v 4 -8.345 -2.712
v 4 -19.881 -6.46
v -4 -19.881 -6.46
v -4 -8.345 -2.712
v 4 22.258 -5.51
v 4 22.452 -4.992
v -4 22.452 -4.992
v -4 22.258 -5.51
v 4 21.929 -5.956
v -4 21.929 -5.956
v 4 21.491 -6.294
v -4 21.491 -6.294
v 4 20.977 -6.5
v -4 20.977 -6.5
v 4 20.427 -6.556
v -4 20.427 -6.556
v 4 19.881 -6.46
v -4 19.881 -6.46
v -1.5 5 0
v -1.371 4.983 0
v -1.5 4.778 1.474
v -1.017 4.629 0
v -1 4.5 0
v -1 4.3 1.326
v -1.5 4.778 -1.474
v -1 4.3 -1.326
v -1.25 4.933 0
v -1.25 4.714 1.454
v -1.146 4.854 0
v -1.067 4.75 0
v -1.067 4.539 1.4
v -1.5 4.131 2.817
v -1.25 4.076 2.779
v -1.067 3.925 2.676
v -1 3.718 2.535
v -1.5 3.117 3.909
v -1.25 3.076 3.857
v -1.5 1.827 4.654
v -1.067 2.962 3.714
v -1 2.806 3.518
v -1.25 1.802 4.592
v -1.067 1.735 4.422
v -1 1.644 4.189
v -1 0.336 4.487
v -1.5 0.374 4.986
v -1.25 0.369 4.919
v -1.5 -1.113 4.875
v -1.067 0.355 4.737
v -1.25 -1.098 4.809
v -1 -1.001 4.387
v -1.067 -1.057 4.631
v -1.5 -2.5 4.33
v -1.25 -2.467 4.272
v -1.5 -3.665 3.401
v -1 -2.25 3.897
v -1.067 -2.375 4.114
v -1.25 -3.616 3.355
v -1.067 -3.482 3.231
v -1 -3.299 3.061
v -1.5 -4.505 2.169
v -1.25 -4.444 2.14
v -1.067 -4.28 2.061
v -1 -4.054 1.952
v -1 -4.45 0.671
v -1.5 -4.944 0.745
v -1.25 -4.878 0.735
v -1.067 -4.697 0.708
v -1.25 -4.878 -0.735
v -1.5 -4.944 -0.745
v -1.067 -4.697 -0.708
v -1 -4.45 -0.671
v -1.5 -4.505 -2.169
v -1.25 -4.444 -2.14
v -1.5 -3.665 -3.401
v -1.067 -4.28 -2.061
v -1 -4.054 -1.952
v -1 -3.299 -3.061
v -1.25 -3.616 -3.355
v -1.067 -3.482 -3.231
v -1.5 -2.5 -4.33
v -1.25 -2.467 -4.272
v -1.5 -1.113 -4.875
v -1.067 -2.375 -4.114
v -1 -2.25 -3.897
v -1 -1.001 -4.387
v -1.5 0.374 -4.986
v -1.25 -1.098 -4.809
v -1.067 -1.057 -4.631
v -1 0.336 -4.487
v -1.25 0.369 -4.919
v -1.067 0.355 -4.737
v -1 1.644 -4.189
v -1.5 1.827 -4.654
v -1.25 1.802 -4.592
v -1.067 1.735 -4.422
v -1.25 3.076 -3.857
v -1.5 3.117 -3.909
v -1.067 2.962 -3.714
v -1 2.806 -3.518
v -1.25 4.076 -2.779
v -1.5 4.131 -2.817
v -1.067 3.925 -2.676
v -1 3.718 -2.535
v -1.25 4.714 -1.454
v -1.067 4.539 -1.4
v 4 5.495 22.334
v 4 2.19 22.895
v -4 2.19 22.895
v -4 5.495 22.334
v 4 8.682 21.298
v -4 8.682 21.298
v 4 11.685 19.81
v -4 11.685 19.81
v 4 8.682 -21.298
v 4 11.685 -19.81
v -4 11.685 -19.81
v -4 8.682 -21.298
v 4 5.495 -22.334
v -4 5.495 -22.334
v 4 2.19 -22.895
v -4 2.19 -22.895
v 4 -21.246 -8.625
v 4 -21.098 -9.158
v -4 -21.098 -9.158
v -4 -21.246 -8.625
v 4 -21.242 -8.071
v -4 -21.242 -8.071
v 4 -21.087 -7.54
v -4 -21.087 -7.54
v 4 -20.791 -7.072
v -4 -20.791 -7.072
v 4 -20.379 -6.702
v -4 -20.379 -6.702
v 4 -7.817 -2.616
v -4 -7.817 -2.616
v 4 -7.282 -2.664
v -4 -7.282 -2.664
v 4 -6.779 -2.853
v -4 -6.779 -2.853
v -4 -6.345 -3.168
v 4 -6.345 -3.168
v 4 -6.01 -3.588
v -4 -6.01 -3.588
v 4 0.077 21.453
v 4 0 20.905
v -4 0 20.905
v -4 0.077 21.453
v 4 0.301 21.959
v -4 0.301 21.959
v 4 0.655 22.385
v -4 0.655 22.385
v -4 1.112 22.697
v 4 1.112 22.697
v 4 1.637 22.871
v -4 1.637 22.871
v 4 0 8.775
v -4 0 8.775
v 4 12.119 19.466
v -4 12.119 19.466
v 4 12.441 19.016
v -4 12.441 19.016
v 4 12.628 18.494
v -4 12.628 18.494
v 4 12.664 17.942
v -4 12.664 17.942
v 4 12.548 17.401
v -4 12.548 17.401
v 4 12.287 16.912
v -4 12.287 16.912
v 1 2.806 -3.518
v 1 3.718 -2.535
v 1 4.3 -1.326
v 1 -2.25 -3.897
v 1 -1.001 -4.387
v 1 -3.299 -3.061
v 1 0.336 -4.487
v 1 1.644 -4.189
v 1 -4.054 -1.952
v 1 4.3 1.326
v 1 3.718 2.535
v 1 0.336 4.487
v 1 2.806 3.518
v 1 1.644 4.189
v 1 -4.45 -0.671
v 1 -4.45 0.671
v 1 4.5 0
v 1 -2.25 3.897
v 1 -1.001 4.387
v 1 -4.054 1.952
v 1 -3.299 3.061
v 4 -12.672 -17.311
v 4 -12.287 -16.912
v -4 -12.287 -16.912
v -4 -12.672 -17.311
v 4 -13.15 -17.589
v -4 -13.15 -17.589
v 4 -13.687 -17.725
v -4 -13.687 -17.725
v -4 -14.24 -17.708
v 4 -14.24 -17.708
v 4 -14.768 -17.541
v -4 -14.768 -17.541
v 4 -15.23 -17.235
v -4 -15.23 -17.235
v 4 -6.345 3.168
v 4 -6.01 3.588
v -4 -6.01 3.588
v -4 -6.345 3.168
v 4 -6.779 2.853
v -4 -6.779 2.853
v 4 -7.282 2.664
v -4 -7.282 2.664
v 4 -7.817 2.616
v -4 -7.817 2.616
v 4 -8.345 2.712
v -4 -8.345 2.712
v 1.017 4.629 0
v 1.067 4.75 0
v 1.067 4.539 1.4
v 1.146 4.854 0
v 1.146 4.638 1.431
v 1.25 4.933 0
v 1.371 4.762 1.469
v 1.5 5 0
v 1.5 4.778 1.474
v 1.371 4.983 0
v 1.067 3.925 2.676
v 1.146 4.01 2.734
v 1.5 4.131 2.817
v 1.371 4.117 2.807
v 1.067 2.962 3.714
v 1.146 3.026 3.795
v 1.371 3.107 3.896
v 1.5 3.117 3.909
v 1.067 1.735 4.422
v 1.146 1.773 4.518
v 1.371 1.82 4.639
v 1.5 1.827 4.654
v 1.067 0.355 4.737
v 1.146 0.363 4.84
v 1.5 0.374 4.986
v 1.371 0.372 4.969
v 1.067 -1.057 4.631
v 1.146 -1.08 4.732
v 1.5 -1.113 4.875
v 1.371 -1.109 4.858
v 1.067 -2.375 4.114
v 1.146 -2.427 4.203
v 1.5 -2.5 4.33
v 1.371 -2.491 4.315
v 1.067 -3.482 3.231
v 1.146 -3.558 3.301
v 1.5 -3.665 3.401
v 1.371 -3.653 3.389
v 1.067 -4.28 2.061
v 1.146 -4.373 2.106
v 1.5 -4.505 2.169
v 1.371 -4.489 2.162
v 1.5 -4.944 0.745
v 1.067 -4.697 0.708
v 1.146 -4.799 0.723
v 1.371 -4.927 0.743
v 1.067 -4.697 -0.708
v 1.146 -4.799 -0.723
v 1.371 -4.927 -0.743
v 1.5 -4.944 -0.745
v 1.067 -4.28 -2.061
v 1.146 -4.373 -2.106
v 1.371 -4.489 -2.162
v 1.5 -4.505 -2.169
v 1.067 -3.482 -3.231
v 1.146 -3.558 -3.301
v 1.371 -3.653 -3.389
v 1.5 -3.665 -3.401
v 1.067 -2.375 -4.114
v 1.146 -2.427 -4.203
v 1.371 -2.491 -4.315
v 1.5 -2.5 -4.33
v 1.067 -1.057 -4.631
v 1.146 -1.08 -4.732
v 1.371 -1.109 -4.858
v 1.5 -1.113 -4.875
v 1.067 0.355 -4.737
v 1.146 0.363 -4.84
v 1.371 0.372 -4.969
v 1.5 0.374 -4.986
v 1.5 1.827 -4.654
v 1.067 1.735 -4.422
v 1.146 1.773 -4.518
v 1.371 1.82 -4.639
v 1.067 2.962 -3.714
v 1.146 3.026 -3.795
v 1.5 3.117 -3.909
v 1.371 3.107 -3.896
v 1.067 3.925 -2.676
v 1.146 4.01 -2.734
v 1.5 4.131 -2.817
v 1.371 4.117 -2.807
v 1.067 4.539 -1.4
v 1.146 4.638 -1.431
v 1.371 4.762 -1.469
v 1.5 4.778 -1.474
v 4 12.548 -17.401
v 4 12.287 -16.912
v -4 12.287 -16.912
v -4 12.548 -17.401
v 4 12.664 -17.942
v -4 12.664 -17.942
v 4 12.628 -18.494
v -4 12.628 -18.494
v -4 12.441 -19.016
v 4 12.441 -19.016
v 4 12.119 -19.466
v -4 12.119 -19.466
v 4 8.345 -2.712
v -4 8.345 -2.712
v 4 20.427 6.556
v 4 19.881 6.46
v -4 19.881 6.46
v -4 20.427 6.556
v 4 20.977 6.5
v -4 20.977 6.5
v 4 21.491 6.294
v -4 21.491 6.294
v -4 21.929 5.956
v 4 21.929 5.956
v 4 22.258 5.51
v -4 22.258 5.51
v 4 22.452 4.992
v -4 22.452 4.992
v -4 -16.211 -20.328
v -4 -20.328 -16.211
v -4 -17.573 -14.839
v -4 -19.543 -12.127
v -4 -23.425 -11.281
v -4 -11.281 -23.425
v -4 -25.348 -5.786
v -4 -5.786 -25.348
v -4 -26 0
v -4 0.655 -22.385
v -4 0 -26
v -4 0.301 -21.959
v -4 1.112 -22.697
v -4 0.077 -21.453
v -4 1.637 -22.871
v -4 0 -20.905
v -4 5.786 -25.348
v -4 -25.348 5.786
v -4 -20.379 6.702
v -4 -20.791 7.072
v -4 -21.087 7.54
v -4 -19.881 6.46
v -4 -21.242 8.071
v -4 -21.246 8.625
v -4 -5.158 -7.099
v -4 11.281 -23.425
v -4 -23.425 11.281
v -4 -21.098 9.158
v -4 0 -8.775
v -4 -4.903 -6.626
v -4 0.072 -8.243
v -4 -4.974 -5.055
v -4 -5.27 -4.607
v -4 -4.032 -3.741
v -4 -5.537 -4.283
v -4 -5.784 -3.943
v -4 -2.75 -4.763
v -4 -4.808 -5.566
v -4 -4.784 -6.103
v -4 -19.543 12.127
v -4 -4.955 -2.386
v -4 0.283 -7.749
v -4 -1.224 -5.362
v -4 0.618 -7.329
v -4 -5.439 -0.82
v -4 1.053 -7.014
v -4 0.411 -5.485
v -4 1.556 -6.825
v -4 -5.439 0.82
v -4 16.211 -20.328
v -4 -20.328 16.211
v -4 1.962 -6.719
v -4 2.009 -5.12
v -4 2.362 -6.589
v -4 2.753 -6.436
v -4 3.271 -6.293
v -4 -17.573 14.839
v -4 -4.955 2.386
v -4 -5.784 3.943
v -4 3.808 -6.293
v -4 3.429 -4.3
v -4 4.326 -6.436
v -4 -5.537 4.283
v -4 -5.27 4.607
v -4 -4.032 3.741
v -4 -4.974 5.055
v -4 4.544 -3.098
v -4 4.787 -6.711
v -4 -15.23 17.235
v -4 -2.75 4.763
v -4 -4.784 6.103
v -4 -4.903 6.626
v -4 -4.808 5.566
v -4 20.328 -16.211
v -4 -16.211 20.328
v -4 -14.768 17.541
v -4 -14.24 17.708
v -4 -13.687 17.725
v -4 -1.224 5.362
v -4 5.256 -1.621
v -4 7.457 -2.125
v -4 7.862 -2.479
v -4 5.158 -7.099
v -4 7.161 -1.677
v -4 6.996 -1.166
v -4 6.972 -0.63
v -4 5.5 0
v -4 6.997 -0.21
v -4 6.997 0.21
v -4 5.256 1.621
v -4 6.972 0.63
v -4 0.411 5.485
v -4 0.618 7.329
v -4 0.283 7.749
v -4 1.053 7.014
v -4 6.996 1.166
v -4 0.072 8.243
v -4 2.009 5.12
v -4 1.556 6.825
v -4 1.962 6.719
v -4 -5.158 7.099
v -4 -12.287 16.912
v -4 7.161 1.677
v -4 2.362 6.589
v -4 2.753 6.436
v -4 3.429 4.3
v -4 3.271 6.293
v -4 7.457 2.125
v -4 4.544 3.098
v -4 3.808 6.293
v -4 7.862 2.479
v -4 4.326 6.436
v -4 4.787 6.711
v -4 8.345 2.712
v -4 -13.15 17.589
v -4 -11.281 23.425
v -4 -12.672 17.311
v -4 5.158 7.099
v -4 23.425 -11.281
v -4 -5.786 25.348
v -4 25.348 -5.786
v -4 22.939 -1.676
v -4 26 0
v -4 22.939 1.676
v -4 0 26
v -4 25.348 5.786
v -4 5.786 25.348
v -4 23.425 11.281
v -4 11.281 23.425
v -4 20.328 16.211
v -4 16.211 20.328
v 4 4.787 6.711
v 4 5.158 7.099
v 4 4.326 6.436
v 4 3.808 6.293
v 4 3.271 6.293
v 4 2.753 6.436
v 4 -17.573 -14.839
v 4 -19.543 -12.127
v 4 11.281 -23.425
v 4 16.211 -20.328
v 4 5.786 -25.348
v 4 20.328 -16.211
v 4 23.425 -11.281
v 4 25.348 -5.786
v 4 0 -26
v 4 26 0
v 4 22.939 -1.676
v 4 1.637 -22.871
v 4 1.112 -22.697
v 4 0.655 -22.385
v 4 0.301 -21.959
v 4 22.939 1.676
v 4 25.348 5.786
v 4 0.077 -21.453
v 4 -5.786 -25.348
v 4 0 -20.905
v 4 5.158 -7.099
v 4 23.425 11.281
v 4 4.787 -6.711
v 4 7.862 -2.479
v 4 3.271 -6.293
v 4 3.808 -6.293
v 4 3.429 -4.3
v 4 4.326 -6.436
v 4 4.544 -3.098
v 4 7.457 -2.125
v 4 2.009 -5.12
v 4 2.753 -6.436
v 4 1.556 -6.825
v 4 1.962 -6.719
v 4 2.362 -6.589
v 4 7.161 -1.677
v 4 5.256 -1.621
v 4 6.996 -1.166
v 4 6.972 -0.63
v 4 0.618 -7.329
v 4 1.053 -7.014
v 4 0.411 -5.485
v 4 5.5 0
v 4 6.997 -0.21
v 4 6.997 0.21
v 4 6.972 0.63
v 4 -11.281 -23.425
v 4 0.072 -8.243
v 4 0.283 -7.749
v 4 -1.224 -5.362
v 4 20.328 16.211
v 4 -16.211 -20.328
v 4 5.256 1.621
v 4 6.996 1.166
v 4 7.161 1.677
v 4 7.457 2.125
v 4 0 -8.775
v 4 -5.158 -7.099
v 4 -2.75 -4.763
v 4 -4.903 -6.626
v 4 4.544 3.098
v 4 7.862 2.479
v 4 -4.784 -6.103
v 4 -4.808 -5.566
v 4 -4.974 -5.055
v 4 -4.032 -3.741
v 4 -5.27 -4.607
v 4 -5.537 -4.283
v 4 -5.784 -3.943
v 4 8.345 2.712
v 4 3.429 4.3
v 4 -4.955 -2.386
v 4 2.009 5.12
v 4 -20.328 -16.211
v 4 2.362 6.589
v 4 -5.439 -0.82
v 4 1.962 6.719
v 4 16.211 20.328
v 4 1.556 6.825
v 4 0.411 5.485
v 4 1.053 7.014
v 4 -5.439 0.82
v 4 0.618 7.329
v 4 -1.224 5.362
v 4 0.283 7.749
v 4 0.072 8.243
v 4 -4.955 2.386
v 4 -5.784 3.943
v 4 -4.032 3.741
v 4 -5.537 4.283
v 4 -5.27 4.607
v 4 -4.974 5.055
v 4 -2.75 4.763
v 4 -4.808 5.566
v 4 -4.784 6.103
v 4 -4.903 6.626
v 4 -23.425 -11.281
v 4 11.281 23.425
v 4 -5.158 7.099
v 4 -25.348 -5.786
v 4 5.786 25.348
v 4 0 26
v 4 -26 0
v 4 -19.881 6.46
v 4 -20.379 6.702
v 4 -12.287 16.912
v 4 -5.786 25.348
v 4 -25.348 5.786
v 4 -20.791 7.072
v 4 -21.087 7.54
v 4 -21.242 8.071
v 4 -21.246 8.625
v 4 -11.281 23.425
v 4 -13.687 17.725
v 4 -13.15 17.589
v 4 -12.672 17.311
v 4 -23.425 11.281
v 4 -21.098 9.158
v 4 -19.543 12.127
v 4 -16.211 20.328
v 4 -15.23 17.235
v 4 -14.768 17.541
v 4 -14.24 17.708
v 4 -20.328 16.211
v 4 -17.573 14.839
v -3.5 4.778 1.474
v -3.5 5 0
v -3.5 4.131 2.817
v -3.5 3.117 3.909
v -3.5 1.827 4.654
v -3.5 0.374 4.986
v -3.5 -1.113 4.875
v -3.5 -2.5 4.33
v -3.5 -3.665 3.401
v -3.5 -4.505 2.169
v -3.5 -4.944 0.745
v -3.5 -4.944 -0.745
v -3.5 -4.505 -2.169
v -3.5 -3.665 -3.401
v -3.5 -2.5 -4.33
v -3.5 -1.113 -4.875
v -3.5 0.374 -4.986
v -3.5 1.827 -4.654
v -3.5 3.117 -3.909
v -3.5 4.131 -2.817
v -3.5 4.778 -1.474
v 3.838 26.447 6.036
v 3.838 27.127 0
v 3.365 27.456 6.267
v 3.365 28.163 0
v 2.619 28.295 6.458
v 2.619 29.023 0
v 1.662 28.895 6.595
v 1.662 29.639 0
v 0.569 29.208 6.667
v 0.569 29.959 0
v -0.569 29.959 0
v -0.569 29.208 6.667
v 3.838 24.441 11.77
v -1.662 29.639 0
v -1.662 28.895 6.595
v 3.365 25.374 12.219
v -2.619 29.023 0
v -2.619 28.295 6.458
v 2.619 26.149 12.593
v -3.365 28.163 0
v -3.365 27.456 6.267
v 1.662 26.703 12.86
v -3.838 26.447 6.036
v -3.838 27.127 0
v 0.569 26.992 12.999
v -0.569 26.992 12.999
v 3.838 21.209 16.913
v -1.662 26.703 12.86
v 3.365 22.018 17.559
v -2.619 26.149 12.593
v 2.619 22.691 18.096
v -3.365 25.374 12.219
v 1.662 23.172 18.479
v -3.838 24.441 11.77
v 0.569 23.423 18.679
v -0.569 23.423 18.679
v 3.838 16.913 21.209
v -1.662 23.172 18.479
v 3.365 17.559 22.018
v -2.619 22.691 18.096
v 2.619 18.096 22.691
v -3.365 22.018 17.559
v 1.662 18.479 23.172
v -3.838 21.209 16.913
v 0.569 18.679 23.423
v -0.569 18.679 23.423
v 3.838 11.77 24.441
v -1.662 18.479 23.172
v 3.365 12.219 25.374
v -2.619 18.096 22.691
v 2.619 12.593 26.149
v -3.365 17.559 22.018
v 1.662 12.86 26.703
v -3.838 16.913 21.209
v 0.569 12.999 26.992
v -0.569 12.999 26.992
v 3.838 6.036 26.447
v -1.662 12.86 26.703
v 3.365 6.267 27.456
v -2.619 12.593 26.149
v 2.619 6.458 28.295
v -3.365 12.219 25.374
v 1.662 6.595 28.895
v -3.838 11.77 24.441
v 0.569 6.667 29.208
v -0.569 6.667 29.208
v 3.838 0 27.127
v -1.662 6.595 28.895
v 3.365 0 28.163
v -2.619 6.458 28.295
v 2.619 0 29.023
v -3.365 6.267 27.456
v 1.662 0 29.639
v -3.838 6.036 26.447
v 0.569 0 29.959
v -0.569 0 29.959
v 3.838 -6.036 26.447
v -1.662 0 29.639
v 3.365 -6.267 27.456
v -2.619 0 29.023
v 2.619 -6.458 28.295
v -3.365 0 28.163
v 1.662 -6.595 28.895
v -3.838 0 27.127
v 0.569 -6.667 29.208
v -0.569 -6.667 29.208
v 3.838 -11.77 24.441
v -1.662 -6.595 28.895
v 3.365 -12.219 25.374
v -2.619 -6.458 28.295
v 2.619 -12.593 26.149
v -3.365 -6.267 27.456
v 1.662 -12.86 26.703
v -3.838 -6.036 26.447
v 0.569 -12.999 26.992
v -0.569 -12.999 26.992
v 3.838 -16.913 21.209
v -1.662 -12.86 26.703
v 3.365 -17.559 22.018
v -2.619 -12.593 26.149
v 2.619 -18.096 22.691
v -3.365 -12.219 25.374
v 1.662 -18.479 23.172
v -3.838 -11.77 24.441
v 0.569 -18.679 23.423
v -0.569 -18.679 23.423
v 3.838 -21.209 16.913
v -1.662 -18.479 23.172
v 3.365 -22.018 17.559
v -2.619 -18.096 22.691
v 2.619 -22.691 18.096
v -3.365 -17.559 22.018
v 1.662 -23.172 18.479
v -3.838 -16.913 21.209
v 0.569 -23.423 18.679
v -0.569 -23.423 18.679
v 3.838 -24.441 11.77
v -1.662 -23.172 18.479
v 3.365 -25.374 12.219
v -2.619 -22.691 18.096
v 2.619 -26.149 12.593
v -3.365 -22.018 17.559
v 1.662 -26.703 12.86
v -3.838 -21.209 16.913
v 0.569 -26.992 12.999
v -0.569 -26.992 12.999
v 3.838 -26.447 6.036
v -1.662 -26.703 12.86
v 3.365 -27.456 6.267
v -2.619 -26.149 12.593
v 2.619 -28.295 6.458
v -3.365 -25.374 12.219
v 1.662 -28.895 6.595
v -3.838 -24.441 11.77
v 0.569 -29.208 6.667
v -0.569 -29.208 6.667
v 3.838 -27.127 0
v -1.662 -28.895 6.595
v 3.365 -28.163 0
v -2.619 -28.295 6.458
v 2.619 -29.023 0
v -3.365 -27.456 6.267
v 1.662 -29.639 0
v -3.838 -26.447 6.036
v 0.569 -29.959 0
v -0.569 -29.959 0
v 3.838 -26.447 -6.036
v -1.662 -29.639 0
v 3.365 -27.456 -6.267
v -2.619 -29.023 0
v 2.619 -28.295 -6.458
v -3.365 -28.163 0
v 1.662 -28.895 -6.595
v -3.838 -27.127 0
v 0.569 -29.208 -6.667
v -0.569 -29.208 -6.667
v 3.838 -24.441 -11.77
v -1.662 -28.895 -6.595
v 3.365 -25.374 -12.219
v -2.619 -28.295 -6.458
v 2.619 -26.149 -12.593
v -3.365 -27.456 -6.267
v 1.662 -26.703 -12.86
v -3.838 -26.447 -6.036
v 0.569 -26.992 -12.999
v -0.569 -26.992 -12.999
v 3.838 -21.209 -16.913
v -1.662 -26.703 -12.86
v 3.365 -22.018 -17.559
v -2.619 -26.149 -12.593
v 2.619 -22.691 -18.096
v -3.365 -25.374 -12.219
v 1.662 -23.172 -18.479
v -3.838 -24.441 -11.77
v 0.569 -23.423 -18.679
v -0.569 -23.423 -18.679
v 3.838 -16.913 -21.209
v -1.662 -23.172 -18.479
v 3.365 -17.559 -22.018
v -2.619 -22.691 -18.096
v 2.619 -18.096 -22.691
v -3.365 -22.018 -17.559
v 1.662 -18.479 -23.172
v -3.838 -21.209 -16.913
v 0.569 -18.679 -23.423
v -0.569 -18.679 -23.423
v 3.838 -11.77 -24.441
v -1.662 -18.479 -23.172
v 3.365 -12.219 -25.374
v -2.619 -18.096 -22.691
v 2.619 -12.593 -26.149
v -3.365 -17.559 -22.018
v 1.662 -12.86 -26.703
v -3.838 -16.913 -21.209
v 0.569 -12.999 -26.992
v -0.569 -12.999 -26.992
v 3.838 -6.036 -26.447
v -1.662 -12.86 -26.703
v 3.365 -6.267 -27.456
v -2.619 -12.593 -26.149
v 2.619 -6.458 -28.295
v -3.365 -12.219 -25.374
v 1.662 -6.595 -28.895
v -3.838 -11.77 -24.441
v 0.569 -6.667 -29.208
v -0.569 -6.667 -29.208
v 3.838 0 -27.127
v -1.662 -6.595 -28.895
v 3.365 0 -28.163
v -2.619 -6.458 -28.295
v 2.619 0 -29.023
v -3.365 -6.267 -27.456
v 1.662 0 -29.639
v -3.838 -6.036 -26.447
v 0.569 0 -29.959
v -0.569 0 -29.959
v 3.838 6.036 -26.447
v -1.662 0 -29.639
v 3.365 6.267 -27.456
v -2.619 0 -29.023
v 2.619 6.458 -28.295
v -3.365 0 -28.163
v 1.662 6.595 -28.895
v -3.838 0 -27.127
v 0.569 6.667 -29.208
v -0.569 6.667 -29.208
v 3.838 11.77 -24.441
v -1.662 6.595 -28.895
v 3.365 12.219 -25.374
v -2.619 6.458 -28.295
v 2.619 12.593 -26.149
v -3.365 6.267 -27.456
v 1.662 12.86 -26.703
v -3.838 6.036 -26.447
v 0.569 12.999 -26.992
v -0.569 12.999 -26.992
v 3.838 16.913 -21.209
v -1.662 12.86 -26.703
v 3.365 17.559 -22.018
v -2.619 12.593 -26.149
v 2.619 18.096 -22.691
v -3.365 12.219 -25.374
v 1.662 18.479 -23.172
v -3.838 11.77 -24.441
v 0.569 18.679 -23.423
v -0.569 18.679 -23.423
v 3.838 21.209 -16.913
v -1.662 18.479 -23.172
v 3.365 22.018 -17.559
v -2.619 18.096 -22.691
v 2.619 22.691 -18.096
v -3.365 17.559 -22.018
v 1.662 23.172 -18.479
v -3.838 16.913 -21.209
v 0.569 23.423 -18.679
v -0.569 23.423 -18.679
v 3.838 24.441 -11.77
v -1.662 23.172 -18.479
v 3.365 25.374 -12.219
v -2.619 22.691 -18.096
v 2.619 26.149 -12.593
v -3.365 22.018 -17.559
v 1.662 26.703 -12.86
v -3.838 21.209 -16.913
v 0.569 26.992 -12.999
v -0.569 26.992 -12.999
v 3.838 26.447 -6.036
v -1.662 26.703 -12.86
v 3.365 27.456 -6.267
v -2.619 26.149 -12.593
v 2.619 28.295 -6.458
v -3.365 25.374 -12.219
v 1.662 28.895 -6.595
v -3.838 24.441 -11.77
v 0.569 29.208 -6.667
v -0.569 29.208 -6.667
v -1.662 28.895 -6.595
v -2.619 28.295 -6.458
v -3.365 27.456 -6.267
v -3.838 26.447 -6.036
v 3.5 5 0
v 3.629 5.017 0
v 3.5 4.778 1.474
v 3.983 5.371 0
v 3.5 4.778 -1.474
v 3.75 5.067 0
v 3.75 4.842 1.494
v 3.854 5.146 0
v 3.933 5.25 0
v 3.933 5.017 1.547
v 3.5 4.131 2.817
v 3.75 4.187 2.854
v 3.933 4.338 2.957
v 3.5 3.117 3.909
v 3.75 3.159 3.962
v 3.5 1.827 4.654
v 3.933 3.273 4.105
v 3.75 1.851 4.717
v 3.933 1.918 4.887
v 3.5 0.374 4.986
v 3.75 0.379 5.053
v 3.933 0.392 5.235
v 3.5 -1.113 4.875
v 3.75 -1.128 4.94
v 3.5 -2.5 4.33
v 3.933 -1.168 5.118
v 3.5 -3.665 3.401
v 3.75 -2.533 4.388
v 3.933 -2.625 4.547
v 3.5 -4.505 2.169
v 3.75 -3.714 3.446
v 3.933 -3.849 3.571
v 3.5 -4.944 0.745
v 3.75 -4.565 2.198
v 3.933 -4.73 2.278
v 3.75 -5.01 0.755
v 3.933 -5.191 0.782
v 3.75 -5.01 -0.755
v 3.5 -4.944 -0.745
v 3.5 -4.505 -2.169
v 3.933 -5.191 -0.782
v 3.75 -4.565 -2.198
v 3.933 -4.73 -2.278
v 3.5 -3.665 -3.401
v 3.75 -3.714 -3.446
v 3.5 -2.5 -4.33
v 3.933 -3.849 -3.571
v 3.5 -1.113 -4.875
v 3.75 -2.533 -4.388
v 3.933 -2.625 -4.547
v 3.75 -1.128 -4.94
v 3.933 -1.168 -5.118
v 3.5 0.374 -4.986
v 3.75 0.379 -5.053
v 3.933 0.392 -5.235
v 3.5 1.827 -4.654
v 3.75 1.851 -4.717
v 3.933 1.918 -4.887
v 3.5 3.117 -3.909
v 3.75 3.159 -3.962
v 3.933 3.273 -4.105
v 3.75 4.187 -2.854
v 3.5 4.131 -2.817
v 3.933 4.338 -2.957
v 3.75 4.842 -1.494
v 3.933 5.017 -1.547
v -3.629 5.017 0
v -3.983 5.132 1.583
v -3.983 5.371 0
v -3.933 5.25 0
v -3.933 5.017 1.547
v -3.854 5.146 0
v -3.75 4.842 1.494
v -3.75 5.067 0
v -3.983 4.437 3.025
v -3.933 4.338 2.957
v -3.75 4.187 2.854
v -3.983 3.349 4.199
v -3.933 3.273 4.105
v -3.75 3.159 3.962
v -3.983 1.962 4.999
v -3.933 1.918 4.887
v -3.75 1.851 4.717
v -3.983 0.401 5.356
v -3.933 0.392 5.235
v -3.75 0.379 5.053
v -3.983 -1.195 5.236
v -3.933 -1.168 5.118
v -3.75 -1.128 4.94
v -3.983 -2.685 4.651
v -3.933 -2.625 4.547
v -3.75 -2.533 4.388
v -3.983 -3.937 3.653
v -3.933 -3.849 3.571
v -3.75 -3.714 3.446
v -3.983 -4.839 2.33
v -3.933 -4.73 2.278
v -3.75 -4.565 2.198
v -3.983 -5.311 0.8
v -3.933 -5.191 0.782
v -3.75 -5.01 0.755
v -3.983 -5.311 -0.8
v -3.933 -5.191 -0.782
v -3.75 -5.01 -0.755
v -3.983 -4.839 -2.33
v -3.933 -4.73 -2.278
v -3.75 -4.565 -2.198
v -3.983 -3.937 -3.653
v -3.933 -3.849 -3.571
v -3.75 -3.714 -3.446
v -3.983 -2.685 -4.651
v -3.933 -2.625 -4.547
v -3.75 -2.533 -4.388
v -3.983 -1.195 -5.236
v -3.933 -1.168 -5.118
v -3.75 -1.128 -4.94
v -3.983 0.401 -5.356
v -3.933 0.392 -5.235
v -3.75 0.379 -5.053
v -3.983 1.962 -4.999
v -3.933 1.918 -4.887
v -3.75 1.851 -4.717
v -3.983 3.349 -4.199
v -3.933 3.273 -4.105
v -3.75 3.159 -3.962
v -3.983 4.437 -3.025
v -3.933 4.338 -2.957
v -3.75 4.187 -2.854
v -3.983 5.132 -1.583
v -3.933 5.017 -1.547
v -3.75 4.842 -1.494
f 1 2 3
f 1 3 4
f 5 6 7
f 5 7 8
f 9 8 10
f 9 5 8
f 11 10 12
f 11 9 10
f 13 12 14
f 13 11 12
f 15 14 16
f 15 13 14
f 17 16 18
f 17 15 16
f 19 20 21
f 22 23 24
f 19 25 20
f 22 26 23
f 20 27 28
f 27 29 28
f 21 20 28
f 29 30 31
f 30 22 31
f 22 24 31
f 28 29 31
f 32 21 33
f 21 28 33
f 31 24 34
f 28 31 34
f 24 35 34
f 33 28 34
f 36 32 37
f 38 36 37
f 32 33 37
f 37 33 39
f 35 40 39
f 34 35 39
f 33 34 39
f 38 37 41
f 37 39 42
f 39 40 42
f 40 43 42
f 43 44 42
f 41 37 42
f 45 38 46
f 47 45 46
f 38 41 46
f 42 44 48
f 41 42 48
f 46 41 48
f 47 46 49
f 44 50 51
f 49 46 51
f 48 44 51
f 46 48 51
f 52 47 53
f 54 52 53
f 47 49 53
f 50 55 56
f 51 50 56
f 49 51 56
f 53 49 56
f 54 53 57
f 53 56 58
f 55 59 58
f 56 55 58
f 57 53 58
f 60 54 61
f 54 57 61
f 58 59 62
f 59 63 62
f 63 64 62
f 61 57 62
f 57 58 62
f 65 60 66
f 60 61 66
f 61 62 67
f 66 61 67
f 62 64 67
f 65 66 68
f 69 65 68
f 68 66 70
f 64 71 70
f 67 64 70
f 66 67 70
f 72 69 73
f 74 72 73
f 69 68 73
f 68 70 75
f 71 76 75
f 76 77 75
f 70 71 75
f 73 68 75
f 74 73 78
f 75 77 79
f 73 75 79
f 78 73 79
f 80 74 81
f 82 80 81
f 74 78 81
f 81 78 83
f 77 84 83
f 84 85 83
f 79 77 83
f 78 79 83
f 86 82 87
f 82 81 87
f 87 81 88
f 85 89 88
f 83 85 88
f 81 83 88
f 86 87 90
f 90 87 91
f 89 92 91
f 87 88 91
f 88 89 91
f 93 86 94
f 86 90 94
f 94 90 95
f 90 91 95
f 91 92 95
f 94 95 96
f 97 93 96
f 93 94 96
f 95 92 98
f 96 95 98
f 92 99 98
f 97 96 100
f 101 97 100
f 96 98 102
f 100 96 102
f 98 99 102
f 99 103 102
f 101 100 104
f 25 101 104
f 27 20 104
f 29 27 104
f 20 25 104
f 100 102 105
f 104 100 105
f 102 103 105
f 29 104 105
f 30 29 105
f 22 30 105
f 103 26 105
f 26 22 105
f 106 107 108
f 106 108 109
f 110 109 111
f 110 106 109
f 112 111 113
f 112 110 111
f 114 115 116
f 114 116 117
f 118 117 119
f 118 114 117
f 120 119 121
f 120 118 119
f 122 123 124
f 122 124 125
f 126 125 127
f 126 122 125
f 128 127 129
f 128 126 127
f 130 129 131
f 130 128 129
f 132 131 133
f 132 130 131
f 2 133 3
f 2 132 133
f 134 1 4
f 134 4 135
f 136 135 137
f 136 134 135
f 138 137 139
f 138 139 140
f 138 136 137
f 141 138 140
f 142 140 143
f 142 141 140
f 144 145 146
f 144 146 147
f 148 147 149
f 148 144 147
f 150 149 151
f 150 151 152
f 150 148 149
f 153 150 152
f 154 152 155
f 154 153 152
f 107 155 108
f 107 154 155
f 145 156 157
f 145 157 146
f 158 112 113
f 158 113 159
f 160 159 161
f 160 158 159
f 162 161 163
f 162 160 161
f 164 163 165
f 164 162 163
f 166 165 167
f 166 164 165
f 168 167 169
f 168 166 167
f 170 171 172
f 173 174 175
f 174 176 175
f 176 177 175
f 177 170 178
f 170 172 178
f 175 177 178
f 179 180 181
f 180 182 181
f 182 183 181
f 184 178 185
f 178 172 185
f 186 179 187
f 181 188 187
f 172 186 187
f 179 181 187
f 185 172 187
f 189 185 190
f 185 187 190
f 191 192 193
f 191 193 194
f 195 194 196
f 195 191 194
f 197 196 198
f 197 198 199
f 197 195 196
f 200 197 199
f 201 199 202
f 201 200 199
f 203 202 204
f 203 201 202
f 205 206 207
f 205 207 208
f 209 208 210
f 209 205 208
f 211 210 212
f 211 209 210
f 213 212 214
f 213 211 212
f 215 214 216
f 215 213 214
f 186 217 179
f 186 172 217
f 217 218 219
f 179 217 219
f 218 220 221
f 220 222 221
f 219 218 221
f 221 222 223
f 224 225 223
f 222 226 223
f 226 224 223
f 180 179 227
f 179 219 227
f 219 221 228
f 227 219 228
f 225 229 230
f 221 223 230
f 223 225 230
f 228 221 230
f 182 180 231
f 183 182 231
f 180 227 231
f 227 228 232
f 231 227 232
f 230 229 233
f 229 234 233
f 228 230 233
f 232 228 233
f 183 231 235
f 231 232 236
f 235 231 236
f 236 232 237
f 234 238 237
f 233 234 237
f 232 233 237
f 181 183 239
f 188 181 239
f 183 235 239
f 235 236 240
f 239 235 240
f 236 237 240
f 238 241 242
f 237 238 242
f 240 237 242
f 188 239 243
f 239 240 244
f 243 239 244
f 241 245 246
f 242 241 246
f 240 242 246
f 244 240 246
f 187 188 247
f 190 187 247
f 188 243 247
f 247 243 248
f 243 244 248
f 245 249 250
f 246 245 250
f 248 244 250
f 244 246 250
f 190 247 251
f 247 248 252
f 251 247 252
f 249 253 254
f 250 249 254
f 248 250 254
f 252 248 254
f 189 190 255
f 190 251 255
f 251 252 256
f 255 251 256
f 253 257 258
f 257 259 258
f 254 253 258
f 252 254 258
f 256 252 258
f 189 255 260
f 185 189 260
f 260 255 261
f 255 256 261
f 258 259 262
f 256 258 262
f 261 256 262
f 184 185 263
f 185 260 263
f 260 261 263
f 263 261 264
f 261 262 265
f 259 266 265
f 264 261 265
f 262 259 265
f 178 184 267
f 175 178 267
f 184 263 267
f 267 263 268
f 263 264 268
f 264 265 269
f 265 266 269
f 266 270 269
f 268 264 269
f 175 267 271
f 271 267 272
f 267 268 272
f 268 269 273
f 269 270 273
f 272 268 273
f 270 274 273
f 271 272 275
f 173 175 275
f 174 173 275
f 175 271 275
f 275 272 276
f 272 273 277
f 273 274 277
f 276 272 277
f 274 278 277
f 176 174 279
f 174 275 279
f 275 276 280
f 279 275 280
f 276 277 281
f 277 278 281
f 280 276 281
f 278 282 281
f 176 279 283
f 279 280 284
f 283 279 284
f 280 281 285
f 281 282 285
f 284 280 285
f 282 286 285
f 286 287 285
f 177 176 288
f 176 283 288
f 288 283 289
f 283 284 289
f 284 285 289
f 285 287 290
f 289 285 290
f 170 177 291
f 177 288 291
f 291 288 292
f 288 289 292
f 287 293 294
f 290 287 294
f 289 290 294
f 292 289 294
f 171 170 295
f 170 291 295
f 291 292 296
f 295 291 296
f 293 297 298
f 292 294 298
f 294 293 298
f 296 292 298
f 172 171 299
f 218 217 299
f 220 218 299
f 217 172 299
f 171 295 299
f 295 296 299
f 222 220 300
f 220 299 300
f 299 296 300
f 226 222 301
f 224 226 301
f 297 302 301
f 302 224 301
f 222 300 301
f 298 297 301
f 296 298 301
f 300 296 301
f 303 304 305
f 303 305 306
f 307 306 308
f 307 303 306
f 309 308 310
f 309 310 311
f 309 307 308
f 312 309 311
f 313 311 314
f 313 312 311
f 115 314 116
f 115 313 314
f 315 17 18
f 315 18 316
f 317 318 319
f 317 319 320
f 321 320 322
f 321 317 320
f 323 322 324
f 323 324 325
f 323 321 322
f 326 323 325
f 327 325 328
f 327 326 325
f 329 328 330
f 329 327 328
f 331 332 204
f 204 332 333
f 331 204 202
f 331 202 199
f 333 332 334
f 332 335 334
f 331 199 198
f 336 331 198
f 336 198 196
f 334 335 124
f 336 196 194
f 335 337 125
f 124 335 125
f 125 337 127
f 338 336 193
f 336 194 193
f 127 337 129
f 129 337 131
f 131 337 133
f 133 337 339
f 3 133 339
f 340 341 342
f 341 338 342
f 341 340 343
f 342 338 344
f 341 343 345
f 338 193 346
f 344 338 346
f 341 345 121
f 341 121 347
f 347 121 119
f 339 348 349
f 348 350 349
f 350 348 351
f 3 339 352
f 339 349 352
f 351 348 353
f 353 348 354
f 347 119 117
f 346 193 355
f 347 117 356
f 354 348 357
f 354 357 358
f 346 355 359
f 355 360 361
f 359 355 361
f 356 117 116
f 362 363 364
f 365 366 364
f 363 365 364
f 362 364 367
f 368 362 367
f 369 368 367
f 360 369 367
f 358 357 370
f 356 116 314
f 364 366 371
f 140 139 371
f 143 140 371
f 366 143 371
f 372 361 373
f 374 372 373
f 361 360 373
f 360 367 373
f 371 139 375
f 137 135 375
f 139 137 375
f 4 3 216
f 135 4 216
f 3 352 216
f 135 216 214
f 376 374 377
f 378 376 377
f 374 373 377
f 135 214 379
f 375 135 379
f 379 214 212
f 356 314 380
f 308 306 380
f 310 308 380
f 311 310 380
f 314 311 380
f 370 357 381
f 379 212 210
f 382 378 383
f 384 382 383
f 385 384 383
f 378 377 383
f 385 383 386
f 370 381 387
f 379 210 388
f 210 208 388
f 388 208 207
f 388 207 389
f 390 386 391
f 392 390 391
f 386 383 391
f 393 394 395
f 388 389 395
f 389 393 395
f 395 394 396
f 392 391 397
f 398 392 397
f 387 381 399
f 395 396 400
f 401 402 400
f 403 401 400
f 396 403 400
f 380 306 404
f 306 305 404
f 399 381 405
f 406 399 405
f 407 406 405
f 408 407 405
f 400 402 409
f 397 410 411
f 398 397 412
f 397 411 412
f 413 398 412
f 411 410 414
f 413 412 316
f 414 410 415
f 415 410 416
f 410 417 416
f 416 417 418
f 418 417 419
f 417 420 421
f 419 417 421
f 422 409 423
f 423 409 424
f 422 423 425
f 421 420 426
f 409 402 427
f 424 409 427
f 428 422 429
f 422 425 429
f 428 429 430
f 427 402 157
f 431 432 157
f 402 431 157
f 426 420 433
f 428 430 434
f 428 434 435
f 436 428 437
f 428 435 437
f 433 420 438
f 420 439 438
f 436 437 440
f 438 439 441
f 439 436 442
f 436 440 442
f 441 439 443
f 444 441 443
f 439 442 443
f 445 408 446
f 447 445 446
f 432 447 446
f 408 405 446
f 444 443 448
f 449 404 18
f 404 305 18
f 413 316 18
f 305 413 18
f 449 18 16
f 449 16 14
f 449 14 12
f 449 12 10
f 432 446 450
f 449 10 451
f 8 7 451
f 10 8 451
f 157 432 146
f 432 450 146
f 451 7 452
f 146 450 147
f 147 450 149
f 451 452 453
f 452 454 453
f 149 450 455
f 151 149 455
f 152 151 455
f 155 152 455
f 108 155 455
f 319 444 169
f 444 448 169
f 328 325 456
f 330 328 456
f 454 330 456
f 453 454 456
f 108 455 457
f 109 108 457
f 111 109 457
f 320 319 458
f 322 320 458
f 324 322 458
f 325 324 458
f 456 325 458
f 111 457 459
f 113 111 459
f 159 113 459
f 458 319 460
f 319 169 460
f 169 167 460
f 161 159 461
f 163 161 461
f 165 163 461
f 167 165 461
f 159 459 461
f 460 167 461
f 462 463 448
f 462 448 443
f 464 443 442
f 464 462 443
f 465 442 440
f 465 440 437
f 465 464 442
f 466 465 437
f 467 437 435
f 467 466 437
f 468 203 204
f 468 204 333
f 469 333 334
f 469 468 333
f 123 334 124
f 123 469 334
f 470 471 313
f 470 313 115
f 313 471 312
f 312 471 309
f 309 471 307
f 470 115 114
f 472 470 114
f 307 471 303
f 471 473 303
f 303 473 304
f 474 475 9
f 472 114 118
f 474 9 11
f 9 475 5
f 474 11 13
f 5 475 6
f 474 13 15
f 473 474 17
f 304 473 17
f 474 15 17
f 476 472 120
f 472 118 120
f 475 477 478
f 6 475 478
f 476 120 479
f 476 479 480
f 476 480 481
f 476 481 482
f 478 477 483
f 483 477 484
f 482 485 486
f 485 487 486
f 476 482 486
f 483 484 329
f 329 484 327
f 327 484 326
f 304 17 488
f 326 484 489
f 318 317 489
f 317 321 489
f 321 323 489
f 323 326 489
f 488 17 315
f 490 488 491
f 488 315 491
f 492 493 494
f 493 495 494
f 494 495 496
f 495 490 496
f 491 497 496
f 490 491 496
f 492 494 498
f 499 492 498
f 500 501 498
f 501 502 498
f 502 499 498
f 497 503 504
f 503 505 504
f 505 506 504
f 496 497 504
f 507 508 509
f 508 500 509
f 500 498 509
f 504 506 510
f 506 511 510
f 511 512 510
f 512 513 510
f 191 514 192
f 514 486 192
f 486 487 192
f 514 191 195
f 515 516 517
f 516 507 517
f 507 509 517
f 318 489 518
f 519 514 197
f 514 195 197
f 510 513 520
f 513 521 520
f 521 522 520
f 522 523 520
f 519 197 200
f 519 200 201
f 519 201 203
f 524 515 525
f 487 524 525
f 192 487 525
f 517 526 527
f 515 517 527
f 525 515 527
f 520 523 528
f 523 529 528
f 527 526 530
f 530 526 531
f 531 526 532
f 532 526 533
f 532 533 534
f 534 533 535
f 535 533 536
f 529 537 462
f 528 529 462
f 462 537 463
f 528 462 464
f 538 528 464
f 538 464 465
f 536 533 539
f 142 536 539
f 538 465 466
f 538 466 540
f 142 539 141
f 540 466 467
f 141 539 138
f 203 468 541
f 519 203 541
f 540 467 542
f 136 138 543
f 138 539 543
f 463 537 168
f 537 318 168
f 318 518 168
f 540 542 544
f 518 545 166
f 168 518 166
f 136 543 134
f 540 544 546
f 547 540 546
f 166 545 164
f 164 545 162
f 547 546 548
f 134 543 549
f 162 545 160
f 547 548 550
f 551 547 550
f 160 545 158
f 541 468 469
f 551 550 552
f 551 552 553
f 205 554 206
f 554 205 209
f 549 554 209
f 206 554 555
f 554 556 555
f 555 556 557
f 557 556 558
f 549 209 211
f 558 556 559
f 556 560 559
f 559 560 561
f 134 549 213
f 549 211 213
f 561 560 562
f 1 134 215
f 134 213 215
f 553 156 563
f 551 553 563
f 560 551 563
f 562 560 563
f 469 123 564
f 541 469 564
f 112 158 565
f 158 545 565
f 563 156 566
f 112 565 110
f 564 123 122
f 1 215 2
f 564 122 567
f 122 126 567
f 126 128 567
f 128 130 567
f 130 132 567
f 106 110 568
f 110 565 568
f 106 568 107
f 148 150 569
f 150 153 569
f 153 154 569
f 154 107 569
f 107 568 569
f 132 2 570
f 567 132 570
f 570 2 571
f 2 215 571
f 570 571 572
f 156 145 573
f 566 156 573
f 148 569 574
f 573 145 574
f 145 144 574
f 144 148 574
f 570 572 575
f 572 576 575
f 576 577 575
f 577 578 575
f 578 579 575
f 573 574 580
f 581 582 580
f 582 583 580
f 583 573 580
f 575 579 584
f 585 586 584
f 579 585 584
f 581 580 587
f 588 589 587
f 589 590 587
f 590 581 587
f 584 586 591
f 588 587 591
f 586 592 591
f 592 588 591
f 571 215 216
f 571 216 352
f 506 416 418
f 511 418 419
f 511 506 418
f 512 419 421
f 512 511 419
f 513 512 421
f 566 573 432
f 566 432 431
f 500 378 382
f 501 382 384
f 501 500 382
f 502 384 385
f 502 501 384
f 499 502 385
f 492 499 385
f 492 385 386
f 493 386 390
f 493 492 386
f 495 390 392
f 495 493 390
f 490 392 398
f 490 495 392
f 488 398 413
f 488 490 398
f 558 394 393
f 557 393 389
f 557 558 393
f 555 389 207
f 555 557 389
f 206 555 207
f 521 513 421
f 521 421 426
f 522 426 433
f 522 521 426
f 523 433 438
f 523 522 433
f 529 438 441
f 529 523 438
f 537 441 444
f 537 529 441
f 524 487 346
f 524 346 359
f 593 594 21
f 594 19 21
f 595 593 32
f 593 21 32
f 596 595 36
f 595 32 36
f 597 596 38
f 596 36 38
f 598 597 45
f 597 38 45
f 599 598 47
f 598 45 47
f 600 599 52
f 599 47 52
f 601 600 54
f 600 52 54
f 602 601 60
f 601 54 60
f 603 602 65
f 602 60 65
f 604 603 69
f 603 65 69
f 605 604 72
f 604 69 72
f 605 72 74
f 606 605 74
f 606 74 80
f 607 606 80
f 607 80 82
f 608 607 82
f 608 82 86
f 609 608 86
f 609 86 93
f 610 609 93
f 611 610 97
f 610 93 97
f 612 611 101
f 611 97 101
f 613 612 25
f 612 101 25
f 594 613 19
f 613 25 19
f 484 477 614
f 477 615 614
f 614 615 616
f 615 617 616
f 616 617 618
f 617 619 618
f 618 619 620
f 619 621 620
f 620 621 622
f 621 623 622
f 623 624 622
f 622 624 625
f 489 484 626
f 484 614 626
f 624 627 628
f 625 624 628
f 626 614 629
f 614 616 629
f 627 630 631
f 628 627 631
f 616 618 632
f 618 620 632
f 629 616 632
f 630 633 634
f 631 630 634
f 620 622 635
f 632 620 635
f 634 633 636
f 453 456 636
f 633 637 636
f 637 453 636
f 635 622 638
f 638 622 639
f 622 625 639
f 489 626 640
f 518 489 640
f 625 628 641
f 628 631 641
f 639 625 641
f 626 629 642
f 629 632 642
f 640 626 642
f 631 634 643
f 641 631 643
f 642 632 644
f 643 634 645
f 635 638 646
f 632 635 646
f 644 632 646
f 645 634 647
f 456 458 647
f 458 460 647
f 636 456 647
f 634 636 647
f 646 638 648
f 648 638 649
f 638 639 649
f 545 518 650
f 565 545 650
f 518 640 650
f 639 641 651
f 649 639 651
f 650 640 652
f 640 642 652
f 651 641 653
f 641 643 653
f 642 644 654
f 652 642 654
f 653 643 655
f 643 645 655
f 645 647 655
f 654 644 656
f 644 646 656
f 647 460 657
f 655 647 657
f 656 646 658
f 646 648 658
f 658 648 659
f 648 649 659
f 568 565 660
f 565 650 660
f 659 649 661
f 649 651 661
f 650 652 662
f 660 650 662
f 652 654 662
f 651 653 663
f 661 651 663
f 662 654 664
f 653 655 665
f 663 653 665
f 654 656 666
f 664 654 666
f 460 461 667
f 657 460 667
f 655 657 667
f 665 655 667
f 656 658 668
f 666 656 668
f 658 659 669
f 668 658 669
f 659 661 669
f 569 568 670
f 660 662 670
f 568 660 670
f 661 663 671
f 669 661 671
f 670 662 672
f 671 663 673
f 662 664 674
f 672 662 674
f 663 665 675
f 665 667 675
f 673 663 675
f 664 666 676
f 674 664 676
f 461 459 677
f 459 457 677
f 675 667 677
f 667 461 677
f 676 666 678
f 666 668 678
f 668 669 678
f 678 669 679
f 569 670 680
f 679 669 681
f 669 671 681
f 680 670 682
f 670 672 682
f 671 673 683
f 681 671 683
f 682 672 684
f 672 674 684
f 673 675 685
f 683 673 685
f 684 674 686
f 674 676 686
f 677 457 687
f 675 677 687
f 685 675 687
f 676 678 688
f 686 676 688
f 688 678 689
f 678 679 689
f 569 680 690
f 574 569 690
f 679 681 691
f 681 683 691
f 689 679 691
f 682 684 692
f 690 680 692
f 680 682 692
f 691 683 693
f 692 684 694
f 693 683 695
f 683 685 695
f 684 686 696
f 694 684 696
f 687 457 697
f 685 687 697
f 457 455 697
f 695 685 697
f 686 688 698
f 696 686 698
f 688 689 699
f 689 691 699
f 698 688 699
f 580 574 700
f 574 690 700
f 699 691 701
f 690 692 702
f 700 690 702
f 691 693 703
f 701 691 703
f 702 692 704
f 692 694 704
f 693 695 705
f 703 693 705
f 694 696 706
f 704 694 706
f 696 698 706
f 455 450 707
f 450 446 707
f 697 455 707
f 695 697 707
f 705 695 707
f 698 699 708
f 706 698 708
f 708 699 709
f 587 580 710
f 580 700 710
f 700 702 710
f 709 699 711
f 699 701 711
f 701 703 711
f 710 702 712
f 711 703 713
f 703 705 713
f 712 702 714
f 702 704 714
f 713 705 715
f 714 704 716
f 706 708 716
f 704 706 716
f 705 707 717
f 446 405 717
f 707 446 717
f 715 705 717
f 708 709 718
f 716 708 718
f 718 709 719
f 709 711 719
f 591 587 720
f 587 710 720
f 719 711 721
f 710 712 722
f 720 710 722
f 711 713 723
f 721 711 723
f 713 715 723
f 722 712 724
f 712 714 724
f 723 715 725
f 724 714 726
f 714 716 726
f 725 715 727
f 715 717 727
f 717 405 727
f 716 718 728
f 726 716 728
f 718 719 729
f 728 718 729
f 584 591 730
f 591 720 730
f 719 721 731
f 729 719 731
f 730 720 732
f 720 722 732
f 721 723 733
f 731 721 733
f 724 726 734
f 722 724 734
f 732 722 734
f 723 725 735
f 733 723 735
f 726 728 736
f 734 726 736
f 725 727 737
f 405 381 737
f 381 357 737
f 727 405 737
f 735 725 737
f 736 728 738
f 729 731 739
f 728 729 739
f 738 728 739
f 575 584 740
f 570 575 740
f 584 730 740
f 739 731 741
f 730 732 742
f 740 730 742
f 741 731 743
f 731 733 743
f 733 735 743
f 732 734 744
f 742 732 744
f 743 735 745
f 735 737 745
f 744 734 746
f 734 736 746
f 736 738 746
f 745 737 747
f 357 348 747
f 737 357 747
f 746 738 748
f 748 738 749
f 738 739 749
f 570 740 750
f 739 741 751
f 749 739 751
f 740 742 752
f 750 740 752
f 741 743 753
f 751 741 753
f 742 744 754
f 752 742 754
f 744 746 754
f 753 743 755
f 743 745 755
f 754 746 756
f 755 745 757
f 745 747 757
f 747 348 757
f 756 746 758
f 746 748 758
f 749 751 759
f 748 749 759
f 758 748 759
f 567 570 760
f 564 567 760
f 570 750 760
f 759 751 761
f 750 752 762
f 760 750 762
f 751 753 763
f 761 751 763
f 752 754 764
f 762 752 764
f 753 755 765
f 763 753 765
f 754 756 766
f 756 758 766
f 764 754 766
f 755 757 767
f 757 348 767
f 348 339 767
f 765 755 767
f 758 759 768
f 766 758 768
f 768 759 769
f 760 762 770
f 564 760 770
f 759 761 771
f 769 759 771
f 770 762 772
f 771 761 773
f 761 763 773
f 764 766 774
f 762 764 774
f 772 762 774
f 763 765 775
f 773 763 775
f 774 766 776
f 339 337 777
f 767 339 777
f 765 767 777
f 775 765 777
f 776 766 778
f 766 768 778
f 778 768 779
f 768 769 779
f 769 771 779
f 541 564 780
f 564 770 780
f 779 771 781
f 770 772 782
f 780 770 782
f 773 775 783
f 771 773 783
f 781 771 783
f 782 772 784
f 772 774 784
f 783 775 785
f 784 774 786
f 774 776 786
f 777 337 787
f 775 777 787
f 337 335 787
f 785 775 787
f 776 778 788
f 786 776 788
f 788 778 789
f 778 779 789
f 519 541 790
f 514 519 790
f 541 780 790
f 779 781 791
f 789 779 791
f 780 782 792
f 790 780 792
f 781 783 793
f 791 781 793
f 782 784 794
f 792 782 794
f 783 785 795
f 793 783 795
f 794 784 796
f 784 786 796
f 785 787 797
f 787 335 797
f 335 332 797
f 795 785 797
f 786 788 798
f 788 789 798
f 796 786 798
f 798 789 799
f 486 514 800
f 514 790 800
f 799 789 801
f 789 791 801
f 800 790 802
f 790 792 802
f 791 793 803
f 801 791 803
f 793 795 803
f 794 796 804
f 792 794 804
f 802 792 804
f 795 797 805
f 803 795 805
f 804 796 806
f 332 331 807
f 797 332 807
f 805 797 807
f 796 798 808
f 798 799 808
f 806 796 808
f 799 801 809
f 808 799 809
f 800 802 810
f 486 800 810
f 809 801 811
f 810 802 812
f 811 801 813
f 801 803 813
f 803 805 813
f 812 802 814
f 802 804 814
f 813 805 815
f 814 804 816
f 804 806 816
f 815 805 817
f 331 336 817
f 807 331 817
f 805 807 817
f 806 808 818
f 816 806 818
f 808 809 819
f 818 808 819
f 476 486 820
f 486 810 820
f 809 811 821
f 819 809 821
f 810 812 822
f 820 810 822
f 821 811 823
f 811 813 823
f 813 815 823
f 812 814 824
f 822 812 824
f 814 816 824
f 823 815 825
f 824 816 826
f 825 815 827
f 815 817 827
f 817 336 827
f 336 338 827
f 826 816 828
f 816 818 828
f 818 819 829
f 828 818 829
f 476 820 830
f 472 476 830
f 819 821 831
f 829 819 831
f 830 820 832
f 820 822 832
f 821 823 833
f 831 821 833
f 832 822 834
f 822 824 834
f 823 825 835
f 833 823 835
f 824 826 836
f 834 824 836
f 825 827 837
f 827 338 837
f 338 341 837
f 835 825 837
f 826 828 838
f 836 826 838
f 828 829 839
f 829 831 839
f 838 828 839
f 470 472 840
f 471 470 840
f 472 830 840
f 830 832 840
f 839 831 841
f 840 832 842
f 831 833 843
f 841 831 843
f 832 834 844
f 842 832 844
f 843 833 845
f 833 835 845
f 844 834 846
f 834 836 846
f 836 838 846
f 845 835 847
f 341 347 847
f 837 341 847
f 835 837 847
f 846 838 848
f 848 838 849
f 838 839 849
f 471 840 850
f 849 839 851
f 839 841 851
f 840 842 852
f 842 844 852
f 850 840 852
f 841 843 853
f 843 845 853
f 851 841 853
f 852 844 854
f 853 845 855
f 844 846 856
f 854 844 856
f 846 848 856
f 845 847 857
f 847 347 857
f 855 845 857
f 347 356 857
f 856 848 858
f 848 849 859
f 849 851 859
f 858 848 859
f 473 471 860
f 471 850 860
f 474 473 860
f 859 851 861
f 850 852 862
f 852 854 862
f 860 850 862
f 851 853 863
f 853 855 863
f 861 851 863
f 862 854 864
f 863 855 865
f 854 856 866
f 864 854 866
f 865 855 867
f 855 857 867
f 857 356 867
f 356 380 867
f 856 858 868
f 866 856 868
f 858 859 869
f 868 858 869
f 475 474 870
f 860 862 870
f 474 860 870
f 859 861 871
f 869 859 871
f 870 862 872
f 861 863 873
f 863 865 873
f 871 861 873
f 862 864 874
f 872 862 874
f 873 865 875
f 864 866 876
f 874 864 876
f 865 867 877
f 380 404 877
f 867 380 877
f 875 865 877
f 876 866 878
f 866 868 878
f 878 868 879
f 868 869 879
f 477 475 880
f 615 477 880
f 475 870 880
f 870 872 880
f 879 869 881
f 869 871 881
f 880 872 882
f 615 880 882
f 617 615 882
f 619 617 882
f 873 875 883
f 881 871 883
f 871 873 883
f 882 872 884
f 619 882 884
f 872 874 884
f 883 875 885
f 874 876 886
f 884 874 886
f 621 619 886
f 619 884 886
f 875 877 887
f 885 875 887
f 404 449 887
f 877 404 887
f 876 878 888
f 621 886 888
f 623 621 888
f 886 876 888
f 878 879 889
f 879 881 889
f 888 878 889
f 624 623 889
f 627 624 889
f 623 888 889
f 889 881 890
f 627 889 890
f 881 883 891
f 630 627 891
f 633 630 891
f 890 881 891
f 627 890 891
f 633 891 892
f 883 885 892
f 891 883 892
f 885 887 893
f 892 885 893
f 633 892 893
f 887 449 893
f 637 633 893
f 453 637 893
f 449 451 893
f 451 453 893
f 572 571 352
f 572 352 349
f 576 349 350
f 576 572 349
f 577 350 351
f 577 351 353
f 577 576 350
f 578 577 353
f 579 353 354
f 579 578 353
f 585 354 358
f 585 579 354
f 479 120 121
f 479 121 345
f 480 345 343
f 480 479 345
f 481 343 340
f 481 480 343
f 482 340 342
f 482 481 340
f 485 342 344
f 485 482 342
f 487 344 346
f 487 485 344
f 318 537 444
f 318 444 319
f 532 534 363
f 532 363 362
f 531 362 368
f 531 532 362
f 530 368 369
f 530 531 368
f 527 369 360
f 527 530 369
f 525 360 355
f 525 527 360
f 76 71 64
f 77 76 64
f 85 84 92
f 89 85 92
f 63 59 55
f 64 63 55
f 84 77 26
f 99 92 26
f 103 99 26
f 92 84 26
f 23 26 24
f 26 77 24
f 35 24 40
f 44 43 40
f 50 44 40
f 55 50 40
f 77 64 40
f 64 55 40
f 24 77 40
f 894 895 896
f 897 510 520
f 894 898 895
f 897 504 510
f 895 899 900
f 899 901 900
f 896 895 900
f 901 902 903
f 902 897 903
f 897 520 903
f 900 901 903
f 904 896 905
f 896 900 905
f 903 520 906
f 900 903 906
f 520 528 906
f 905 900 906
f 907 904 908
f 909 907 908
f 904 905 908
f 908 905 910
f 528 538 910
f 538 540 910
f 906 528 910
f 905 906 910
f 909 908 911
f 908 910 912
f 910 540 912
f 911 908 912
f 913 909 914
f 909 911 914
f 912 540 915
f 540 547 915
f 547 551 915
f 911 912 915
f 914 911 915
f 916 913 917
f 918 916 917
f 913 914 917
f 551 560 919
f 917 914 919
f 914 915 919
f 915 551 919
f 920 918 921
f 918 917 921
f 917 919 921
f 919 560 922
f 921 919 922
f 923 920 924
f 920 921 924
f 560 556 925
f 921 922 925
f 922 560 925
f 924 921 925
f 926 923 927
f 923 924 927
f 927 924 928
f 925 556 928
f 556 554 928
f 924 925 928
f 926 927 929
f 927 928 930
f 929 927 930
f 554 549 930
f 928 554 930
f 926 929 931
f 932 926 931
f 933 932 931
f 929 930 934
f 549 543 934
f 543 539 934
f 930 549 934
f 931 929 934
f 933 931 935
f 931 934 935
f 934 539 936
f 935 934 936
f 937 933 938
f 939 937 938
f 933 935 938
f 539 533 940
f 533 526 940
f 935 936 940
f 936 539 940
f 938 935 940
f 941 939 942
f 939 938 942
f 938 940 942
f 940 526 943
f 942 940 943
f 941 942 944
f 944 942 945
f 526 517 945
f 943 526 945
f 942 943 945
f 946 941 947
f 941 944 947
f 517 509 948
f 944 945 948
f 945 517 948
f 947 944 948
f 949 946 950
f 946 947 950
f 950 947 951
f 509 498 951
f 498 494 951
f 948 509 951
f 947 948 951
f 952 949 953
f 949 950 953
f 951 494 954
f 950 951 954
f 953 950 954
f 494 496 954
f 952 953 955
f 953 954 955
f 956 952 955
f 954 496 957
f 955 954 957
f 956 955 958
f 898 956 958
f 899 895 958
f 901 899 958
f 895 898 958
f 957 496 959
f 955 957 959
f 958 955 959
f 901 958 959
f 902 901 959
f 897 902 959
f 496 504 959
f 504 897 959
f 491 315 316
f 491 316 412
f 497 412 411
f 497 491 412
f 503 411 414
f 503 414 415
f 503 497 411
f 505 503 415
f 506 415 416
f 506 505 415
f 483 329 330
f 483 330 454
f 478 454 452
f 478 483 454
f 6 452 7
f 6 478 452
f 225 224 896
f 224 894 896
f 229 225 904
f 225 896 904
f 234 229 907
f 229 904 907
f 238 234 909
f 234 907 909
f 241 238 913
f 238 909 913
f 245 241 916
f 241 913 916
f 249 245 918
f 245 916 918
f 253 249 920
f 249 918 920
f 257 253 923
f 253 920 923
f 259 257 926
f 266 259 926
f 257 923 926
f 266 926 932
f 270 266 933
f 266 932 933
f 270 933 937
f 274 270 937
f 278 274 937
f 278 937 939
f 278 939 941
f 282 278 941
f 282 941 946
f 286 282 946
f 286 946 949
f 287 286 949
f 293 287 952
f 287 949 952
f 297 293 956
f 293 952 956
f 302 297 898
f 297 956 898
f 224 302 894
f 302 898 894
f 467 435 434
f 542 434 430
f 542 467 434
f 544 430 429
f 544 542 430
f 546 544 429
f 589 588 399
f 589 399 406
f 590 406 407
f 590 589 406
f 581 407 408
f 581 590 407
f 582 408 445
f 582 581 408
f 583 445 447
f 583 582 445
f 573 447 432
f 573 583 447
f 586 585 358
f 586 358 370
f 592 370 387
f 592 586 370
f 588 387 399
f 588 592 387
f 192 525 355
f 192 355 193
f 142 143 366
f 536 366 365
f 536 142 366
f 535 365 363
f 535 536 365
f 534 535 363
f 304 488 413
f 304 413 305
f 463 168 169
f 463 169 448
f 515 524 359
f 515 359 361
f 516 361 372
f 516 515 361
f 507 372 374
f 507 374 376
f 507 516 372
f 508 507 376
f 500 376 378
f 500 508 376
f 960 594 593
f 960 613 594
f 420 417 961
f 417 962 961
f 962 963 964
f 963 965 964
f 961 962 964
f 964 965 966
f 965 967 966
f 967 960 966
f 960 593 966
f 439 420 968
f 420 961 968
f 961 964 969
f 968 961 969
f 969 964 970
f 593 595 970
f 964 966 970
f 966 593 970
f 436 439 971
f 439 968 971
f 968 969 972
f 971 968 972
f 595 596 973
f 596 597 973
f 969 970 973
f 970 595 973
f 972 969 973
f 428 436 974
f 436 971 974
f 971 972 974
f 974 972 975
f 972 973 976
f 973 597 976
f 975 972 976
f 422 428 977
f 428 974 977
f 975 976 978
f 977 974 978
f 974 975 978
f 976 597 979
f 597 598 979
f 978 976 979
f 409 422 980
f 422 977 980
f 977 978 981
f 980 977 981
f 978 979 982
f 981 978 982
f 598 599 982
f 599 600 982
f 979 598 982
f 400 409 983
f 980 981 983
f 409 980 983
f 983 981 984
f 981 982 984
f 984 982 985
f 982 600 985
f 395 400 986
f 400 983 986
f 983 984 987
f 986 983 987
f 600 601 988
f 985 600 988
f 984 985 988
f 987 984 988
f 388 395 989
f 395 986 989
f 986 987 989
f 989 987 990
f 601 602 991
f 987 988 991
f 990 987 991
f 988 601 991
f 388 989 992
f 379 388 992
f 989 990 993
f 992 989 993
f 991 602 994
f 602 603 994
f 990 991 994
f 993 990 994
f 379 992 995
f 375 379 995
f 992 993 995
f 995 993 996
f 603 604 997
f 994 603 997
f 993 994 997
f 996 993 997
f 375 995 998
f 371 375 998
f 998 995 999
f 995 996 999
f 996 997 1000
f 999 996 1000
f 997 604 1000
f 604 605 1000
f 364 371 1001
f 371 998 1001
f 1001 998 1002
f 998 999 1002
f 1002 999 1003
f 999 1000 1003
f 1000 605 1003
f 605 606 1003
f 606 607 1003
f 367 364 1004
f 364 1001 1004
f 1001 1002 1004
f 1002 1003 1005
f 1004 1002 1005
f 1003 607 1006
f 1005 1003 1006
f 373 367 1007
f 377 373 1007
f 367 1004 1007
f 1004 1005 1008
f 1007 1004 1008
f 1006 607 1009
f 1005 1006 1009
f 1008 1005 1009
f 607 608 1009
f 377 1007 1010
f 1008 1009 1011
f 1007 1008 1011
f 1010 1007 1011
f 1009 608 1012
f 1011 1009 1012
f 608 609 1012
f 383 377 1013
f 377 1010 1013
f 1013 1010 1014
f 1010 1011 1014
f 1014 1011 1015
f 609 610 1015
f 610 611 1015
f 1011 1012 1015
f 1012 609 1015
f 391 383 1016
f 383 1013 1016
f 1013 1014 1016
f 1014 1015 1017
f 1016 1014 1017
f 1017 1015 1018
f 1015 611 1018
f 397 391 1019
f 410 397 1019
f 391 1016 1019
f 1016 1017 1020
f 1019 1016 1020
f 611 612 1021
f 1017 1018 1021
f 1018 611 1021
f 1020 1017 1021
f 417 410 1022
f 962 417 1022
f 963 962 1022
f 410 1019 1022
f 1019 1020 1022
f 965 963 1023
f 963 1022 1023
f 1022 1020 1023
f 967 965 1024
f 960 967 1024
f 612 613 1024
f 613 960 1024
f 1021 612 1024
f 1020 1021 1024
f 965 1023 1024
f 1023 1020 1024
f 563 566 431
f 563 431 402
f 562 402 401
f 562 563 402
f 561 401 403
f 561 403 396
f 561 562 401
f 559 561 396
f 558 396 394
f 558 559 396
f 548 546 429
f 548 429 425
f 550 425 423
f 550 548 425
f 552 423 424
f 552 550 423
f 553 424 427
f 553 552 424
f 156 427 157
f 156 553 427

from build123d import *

# Parameters (mm, degrees)
CUT_EXTRUDE1_DEPTH = 8
CIRPATTERN1_COUNT  = 5


with BuildPart() as part:
    # Sketch3 → Revolve1 (revolve)
    with BuildSketch(Plane.XY):
        with BuildLine():
            Line((-1, 0), (1, 0))
            Line((1, 0), (1, 4.5))
            ThreePointArc((1, 4.5), (1.146446609, 4.853553391), (1.5, 5))
            Line((1.5, 5), (3.5, 5))
            ThreePointArc((3.5, 5), (3.853553391, 5.146446609), (4, 5.5))
            Line((4, 5.5), (4, 26))
            ThreePointArc((4, 26), (0, 30), (-4, 26))
            Line((-4, 26), (-4, 5.5))
            ThreePointArc((-4, 5.5), (-3.853553391, 5.146446609), (-3.5, 5))
            Line((-3.5, 5), (-1.5, 5))
            ThreePointArc((-1.5, 5), (-1.146446609, 4.853553391), (-1, 4.5))
            Line((-1, 4.5), (-1, 0))
        make_face()
    revolve(axis=Axis((0, 0, 0), (1, 0, 0)))

    # Sketch6 → Cut-Extrude1 (cut)
    with BuildSketch(Plane(origin=(4, 0, 0), x_dir=(0, 0, -1), z_dir=(1, 0, 0))):
        with BuildLine():
            Line((7.099095314, 5.157794656), (16.912132133, 12.287383234))
            ThreePointArc((16.912132133, 12.287383234), (18.494388462, 12.627564412), (19.810340984, 11.685477744))
            ThreePointArc((19.810340984, 11.685477744), (21.874299875, 7.107390871), (22.895454004, 2.19047619))
            ThreePointArc((22.895454004, 2.19047619), (22.3845707, 0.654814582), (20.90454496, 0))
            Line((20.90454496, 0), (8.774964387, 0))
            ThreePointArc((8.774964387, 0), (7.527745258, 0.43652808), (6.824972301, 1.555555556))
            ThreePointArc((6.824972301, 1.555555556), (6.657395614, 2.163118961), (6.435851193, 2.753147186))
            ThreePointArc((6.435851193, 2.753147186), (6.346658611, 4.071539011), (7.099095314, 5.157794656))
        make_face()
    cut_extrude1 = extrude(amount=-CUT_EXTRUDE1_DEPTH, mode=Mode.SUBTRACT)

    # CirPattern1: Cut-Extrude1 ×5 about axis
    cirpattern1_axis = Axis((0, 0, 0), (1, 0, 0))
    for i in range(1, CIRPATTERN1_COUNT):
        add(cut_extrude1.rotate(cirpattern1_axis, i * 360 / CIRPATTERN1_COUNT), mode=Mode.SUBTRACT)


solid = part.part
